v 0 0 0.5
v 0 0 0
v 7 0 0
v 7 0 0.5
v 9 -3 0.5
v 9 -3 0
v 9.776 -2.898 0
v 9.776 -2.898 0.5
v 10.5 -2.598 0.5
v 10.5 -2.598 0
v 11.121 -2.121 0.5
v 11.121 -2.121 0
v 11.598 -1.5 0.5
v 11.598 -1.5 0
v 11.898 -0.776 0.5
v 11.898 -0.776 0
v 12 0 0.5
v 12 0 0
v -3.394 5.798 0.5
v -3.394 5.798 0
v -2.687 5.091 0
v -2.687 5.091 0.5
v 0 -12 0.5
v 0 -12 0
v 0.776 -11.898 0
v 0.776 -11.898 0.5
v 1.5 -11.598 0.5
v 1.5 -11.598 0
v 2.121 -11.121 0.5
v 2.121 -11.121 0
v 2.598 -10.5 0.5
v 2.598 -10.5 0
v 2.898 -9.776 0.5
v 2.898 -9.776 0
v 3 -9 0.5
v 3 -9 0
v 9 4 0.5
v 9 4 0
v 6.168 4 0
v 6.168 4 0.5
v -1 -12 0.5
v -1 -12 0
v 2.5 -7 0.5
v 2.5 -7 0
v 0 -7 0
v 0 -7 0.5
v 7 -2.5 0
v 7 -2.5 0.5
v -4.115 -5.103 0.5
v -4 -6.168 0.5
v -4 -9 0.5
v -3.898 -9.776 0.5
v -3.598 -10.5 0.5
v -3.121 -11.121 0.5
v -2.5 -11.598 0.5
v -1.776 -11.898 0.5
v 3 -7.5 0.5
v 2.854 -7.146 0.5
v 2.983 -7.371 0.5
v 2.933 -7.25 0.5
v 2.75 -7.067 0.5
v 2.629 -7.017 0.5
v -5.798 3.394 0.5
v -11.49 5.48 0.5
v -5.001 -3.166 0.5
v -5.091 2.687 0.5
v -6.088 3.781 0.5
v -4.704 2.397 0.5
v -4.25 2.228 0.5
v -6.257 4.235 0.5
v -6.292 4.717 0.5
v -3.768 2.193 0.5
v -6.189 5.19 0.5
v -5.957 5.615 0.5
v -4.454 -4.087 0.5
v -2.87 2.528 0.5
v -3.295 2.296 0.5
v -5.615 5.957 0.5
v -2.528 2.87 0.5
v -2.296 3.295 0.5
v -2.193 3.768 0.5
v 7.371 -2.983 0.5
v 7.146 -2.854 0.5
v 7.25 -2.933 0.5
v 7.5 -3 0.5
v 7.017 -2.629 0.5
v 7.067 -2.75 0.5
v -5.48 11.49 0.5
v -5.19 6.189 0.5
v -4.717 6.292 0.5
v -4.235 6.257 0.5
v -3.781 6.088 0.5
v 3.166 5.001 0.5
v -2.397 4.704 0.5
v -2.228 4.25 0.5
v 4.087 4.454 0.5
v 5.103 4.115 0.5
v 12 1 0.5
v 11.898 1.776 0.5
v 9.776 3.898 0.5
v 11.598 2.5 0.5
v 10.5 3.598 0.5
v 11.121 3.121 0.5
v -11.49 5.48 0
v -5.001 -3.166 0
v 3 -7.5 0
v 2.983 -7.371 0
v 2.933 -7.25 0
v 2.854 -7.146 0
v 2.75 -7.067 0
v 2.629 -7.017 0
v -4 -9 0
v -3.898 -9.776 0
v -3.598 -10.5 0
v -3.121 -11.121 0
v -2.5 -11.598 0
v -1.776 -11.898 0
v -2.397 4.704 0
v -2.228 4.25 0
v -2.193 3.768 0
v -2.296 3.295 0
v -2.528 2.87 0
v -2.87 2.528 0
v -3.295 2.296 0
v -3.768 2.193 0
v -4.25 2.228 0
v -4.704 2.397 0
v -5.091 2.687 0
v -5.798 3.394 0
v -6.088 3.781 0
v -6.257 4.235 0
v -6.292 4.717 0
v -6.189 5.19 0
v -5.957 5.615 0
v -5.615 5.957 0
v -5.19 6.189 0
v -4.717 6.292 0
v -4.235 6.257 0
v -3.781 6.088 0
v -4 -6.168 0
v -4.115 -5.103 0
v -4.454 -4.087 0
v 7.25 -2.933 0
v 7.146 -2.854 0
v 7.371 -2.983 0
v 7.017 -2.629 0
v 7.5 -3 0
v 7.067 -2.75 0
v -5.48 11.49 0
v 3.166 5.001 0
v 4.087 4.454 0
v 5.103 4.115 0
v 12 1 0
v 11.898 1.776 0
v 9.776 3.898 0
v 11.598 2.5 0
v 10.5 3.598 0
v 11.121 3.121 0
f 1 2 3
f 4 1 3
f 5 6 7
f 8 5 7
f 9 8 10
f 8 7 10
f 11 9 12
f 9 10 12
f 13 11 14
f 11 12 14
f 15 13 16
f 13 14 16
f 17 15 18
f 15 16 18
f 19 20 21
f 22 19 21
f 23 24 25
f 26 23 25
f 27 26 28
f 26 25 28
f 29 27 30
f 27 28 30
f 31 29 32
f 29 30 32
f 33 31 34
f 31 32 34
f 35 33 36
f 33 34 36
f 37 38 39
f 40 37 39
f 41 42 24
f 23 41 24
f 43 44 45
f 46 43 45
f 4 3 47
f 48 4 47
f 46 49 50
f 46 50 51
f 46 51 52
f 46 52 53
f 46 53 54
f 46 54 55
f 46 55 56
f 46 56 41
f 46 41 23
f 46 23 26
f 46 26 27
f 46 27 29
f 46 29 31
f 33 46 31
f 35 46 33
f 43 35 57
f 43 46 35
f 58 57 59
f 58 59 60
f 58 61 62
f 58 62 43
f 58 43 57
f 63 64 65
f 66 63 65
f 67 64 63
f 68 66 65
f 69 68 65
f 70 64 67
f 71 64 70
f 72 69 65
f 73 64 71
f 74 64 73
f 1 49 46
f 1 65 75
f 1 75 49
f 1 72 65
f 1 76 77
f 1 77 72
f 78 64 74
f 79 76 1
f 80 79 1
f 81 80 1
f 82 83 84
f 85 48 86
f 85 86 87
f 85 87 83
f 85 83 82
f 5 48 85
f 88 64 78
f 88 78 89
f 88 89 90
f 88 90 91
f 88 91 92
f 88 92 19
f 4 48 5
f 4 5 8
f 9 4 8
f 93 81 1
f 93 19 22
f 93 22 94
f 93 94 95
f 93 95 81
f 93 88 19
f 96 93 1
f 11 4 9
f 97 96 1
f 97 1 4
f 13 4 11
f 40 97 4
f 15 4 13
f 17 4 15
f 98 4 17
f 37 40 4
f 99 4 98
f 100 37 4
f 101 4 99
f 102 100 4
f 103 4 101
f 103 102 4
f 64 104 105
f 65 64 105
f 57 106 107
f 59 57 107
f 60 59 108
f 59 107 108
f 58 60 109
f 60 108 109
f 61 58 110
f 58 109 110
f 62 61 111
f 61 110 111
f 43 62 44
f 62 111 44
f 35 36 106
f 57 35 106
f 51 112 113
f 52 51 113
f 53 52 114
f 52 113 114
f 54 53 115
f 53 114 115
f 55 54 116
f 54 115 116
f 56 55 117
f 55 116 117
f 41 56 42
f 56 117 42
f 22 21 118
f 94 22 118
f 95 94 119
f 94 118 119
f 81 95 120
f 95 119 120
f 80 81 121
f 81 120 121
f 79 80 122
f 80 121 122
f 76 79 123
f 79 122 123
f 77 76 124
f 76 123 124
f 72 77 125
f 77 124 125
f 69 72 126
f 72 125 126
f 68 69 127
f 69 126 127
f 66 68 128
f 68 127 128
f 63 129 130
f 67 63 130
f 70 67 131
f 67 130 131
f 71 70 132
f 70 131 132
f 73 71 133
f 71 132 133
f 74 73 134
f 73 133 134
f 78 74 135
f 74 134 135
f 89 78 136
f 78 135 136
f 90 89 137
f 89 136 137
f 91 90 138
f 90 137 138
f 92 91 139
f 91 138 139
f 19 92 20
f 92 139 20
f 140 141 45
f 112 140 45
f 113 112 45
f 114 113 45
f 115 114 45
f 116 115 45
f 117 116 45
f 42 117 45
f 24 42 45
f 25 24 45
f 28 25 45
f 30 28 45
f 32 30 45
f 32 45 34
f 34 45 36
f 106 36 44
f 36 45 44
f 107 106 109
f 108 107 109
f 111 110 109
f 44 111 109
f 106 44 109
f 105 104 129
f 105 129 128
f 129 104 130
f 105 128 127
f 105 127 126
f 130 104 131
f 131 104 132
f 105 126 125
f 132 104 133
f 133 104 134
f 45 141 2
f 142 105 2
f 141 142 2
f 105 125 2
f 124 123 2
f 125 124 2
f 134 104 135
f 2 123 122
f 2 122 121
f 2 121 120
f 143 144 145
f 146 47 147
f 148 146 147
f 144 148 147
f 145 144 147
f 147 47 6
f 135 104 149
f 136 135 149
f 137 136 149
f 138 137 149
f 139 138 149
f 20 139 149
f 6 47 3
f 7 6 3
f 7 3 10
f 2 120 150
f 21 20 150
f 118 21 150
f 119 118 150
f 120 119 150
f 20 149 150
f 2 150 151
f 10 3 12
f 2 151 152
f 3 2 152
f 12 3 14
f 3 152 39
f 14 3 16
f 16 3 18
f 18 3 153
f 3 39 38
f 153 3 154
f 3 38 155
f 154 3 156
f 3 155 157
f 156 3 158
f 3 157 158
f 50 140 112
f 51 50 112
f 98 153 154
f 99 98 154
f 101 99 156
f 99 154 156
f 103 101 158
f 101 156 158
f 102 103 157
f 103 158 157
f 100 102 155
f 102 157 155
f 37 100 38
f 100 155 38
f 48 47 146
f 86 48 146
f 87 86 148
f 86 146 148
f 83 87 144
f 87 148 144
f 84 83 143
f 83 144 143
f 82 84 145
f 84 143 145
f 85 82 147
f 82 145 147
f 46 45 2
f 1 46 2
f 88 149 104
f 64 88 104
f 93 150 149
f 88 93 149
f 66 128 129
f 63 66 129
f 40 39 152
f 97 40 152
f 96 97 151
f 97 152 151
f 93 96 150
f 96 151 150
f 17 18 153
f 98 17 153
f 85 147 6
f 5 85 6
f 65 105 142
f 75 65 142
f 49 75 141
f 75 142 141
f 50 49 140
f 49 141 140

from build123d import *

# Parameters (mm, degrees)
F1_DEPTH = 0.5


with BuildPart() as f1:
    # F0 (on Top) → F1 (new body)
    with BuildSketch(Plane.XY):
        with BuildLine():
            Line((3.166242, 5.001044), (-5.480078, 11.490485))
            Line((-5.480078, 11.490485), (-11.490485, 5.480078))
            Line((-11.490485, 5.480078), (-5.001044, -3.166242))
            ThreePointArc((-5.001044, -3.166242), (-4.256859, -4.585669), (-4, -6.167633))
            Line((-4, -6.167633), (-4, -9))
            ThreePointArc((-4, -9), (-3.12132, -11.12132), (-1, -12))
            Line((-1, -12), (0, -12))
            ThreePointArc((0, -12), (2.12132, -11.12132), (3, -9))
            Line((3, -9), (3, -7.5))
            ThreePointArc((3, -7.5), (2.853553, -7.146447), (2.5, -7))
            Line((2.5, -7), (0, -7))
            Line((0, -7), (0, 0))
            Line((0, 0), (7, 0))
            Line((7, 0), (7, -2.5))
            ThreePointArc((7, -2.5), (7.146447, -2.853553), (7.5, -3))
            Line((7.5, -3), (9, -3))
            ThreePointArc((9, -3), (11.12132, -2.12132), (12, 0))
            Line((12, 0), (12, 1))
            ThreePointArc((12, 1), (11.12132, 3.12132), (9, 4))
            Line((9, 4), (6.167633, 4))
            ThreePointArc((6.167633, 4), (4.585669, 4.256859), (3.166242, 5.001044))
        make_face()
        with BuildLine():
            ThreePointArc((-2.687006, 5.091169), (-2.687006, 2.687006), (-5.091169, 2.687006))
            Line((-5.091169, 2.687006), (-5.798276, 3.394113))
            ThreePointArc((-5.798276, 3.394113), (-5.798276, 5.798276), (-3.394113, 5.798276))
            Line((-3.394113, 5.798276), (-2.687006, 5.091169))
        make_face(mode=Mode.SUBTRACT)
    extrude(amount=F1_DEPTH)


solid = f1.part
